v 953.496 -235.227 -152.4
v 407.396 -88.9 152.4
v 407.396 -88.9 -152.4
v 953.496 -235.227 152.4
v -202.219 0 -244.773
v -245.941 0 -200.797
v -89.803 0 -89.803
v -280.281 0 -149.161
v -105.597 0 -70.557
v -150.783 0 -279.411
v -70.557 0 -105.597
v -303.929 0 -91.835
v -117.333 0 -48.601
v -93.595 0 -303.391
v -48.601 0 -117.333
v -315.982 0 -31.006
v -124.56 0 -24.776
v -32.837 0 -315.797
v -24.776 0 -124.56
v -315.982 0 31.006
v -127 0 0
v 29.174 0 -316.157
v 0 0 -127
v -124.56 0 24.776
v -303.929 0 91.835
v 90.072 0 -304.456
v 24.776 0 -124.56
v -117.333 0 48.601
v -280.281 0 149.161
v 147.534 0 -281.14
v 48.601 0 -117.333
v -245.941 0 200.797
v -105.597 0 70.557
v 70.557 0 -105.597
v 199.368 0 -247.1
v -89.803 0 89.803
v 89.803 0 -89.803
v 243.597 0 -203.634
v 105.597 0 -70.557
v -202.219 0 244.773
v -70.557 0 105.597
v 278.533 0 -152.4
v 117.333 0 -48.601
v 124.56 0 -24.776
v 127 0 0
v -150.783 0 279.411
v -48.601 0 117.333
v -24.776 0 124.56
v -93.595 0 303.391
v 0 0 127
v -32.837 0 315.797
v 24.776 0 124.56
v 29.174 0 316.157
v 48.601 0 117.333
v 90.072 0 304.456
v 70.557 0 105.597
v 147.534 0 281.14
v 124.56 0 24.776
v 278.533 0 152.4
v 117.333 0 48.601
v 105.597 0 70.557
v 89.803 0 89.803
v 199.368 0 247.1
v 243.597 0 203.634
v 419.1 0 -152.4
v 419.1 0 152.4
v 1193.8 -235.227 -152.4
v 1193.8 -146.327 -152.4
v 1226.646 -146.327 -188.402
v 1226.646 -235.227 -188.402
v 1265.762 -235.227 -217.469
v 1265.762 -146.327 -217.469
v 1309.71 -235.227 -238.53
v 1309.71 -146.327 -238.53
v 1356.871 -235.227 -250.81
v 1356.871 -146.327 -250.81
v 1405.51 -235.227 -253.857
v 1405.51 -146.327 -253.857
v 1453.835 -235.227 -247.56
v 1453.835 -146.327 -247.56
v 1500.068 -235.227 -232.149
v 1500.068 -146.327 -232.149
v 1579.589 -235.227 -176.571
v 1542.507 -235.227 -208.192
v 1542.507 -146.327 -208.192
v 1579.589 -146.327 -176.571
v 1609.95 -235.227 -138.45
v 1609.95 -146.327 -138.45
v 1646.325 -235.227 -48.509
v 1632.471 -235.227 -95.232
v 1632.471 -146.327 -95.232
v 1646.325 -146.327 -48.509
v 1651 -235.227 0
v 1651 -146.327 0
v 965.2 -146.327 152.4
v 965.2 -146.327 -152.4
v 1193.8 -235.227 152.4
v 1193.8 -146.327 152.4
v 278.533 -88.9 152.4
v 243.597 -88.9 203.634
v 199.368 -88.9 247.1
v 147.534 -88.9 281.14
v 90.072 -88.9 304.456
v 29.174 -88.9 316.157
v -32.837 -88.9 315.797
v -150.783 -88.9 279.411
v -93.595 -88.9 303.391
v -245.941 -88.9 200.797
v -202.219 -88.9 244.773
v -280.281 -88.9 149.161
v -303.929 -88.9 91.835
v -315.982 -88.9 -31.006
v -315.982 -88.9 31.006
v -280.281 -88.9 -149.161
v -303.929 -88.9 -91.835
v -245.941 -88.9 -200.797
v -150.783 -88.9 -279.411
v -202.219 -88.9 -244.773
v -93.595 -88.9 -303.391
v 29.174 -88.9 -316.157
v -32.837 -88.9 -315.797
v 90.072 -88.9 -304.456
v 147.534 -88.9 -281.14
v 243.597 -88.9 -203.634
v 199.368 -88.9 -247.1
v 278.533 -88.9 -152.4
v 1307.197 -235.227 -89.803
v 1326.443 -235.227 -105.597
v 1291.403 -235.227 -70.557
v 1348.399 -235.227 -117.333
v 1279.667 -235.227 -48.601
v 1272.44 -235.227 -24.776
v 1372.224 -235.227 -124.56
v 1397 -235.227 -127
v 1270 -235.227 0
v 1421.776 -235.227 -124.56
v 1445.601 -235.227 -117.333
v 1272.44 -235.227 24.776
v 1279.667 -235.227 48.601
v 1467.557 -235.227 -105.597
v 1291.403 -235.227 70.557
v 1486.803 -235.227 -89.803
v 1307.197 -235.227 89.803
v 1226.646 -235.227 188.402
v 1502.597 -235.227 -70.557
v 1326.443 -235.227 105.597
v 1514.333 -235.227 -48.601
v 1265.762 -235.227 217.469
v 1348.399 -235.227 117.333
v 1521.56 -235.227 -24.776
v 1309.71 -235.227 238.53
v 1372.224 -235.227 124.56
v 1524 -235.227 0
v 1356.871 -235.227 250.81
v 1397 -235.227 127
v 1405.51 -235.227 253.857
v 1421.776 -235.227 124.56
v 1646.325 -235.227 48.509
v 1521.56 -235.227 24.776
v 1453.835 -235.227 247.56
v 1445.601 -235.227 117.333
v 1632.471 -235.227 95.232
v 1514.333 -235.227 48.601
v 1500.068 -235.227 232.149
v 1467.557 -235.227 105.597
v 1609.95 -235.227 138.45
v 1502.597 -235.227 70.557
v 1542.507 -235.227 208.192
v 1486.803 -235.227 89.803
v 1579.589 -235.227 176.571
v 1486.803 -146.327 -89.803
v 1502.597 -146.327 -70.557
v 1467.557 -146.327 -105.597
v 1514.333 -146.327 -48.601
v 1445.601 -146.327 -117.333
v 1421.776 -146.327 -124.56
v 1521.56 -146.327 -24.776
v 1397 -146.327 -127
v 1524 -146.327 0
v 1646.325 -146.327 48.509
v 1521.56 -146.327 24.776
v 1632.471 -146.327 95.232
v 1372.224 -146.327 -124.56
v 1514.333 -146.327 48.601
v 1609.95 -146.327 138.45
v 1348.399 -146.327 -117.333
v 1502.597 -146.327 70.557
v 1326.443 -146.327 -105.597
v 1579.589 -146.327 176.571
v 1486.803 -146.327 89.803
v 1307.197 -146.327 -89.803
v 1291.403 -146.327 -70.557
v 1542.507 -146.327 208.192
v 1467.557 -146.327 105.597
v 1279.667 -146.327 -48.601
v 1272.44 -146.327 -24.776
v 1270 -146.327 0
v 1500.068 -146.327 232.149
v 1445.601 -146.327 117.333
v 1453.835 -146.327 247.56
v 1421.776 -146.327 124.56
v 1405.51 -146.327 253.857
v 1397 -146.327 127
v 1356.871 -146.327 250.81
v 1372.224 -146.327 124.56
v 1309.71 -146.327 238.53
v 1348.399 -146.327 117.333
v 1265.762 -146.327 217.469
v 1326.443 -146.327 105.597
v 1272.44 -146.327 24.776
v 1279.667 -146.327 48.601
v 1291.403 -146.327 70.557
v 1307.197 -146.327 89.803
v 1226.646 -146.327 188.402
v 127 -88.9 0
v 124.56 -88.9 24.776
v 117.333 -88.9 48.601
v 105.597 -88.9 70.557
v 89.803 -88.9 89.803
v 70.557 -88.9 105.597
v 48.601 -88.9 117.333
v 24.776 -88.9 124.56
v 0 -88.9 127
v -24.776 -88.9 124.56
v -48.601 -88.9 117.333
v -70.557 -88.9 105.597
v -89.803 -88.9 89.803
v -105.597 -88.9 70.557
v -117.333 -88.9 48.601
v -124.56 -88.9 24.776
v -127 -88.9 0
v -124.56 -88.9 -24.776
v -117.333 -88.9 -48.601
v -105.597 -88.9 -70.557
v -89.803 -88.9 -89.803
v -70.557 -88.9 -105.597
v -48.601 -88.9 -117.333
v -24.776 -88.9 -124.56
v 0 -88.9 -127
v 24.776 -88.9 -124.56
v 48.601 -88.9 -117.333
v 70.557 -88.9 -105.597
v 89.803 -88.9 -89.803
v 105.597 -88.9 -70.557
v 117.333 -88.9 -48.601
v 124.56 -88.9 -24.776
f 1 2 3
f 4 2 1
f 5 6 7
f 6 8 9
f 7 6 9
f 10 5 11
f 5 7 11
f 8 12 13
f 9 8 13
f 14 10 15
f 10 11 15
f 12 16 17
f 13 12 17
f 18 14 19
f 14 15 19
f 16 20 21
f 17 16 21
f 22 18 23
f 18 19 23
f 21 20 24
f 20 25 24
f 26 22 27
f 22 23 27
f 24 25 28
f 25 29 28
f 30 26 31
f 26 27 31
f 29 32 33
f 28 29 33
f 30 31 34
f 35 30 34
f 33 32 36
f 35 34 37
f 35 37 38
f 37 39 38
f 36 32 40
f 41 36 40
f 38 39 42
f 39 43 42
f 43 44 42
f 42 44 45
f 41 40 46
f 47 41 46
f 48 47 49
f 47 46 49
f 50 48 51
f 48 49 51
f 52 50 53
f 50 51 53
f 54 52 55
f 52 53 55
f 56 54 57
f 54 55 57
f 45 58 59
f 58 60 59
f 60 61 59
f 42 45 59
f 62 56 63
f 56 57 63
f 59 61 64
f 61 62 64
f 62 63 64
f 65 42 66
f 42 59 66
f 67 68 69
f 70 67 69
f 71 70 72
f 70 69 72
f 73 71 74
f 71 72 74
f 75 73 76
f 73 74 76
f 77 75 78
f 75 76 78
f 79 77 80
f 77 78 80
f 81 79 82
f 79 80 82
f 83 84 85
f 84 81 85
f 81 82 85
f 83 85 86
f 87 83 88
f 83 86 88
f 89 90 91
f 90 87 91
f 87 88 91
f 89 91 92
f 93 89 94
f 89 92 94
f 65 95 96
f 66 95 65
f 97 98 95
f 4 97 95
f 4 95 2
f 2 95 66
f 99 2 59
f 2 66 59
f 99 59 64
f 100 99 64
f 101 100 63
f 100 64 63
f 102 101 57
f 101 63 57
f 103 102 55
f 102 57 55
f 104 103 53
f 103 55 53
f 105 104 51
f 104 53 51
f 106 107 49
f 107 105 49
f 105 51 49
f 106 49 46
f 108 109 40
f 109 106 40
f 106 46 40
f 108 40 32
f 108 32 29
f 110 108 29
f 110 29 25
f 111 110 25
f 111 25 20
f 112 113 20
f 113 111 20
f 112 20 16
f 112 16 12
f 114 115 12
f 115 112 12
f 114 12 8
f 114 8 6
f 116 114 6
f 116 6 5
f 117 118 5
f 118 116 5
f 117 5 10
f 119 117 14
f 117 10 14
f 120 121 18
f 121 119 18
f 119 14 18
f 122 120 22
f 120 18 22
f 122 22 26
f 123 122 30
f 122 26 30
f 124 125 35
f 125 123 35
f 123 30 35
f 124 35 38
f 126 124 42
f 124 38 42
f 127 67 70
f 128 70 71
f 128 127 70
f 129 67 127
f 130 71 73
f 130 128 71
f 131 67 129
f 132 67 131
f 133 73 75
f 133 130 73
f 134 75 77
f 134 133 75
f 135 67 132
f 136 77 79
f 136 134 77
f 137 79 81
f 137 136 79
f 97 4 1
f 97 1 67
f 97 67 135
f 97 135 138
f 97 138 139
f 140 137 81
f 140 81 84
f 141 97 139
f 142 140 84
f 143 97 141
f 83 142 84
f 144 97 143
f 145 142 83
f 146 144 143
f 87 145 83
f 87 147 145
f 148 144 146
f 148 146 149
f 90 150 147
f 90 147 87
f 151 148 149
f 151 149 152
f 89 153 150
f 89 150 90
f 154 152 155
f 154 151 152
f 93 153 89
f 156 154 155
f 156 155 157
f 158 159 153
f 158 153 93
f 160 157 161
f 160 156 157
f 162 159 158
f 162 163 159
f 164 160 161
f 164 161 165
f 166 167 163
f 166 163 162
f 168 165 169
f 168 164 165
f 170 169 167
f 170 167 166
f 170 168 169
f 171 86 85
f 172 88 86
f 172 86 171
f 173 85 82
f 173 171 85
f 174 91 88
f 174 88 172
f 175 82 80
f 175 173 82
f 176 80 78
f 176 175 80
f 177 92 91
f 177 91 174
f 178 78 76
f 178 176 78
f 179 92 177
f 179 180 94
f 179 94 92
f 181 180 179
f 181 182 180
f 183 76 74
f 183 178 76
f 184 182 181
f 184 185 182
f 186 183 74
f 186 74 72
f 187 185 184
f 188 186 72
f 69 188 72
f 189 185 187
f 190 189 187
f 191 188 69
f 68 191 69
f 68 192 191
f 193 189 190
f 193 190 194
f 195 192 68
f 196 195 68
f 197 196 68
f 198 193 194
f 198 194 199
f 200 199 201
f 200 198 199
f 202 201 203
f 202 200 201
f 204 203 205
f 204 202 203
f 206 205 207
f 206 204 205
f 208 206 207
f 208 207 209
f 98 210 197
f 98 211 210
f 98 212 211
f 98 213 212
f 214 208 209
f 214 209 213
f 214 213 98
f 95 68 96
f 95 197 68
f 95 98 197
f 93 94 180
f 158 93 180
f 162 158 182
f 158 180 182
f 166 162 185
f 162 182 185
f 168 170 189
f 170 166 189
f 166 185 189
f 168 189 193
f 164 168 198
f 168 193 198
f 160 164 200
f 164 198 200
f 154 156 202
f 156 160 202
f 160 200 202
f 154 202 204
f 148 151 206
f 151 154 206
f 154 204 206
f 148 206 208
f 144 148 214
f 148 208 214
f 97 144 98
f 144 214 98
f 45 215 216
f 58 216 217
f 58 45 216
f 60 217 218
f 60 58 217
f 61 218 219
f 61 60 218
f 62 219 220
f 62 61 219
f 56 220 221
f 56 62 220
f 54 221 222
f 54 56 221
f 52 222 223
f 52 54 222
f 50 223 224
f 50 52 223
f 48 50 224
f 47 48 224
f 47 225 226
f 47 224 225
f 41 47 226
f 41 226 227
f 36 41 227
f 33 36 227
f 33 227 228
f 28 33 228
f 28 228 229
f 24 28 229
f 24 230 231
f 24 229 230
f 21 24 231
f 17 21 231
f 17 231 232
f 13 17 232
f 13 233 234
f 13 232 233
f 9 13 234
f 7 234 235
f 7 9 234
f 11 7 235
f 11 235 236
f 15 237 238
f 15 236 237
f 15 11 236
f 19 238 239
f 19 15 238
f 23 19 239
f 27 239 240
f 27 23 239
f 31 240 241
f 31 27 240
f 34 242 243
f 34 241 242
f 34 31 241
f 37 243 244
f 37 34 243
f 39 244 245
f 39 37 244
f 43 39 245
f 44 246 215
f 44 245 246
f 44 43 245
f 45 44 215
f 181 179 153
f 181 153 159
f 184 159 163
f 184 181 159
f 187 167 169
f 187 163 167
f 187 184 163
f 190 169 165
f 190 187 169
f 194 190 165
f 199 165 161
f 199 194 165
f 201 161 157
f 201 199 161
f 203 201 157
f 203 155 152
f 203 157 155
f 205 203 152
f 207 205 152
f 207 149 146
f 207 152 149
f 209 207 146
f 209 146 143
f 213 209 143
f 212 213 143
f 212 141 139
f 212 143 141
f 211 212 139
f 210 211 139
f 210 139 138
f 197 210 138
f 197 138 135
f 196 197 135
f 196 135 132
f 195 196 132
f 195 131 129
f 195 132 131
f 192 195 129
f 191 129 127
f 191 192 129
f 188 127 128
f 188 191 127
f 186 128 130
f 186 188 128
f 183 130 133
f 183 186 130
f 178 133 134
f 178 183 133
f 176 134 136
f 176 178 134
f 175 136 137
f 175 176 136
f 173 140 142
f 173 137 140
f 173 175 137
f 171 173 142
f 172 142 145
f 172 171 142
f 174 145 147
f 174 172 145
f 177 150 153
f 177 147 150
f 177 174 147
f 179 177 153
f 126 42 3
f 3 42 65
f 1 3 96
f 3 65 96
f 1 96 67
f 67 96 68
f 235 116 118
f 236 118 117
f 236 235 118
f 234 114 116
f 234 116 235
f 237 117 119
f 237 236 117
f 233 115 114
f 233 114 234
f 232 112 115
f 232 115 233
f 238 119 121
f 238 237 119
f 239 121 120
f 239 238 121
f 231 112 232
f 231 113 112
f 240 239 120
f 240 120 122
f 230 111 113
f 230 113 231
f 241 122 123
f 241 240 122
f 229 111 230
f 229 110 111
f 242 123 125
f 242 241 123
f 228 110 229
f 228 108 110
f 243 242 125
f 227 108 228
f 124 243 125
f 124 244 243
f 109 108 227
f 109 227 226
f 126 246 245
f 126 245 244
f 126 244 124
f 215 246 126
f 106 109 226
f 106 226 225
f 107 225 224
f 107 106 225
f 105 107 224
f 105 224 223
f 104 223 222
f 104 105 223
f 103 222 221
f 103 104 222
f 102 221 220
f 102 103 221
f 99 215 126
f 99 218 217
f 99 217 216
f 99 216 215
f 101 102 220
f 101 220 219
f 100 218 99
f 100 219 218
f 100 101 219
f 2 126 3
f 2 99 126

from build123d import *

# Parameters (mm, degrees)
F0_R     = 127
F1_DEPTH = 660.4
F3_DEPTH = 490.22


with BuildPart() as f1:
    # F0 (on Front) → F1 (new body)
    with BuildSketch(Plane.XZ):
        with BuildLine():
            ThreePointArc((278.532745, -152.4), (307.603963, -78.651457), (317.5, 0))
            ThreePointArc((317.5, 0), (307.603963, 78.651457), (278.532745, 152.4))
            ThreePointArc((278.532745, 152.4), (-317.5, 0), (278.532745, -152.4))
        make_face()
        Circle(F0_R, mode=Mode.SUBTRACT)
        with BuildLine():
            ThreePointArc((278.532745, 152.4), (307.603963, 78.651457), (317.5, 0))
            ThreePointArc((317.5, 0), (307.603963, -78.651457), (278.532745, -152.4))
            Line((278.532745, -152.4), (1193.8, -152.4))
            ThreePointArc((1193.8, -152.4), (1143, 0), (1193.8, 152.4))
            Line((1193.8, 152.4), (278.532745, 152.4))
        make_face()
        with BuildLine():
            ThreePointArc((1651, 0), (1477.321853, 240.965558), (1193.8, 152.4))
            ThreePointArc((1193.8, 152.4), (1143, 0), (1193.8, -152.4))
            ThreePointArc((1193.8, -152.4), (1477.321853, -240.965558), (1651, 0))
        make_face()
        with Locations((1397, 0)):
            Circle(F0_R, mode=Mode.SUBTRACT)
    extrude(amount=F1_DEPTH)

    # F2 (on Top) → F3 (intersect, symmetric)
    with BuildSketch(Plane.XY):
        Polygon((-317.5, 0), (-317.5, -88.9), (407.396093, -88.9), (953.496093, -235.227054), (1651, -235.227054), (1651, -146.327054), (965.2, -146.327054), (419.1, 0), align=None)
    extrude(amount=F3_DEPTH, both=True, mode=Mode.INTERSECT)


solid = f1.part
